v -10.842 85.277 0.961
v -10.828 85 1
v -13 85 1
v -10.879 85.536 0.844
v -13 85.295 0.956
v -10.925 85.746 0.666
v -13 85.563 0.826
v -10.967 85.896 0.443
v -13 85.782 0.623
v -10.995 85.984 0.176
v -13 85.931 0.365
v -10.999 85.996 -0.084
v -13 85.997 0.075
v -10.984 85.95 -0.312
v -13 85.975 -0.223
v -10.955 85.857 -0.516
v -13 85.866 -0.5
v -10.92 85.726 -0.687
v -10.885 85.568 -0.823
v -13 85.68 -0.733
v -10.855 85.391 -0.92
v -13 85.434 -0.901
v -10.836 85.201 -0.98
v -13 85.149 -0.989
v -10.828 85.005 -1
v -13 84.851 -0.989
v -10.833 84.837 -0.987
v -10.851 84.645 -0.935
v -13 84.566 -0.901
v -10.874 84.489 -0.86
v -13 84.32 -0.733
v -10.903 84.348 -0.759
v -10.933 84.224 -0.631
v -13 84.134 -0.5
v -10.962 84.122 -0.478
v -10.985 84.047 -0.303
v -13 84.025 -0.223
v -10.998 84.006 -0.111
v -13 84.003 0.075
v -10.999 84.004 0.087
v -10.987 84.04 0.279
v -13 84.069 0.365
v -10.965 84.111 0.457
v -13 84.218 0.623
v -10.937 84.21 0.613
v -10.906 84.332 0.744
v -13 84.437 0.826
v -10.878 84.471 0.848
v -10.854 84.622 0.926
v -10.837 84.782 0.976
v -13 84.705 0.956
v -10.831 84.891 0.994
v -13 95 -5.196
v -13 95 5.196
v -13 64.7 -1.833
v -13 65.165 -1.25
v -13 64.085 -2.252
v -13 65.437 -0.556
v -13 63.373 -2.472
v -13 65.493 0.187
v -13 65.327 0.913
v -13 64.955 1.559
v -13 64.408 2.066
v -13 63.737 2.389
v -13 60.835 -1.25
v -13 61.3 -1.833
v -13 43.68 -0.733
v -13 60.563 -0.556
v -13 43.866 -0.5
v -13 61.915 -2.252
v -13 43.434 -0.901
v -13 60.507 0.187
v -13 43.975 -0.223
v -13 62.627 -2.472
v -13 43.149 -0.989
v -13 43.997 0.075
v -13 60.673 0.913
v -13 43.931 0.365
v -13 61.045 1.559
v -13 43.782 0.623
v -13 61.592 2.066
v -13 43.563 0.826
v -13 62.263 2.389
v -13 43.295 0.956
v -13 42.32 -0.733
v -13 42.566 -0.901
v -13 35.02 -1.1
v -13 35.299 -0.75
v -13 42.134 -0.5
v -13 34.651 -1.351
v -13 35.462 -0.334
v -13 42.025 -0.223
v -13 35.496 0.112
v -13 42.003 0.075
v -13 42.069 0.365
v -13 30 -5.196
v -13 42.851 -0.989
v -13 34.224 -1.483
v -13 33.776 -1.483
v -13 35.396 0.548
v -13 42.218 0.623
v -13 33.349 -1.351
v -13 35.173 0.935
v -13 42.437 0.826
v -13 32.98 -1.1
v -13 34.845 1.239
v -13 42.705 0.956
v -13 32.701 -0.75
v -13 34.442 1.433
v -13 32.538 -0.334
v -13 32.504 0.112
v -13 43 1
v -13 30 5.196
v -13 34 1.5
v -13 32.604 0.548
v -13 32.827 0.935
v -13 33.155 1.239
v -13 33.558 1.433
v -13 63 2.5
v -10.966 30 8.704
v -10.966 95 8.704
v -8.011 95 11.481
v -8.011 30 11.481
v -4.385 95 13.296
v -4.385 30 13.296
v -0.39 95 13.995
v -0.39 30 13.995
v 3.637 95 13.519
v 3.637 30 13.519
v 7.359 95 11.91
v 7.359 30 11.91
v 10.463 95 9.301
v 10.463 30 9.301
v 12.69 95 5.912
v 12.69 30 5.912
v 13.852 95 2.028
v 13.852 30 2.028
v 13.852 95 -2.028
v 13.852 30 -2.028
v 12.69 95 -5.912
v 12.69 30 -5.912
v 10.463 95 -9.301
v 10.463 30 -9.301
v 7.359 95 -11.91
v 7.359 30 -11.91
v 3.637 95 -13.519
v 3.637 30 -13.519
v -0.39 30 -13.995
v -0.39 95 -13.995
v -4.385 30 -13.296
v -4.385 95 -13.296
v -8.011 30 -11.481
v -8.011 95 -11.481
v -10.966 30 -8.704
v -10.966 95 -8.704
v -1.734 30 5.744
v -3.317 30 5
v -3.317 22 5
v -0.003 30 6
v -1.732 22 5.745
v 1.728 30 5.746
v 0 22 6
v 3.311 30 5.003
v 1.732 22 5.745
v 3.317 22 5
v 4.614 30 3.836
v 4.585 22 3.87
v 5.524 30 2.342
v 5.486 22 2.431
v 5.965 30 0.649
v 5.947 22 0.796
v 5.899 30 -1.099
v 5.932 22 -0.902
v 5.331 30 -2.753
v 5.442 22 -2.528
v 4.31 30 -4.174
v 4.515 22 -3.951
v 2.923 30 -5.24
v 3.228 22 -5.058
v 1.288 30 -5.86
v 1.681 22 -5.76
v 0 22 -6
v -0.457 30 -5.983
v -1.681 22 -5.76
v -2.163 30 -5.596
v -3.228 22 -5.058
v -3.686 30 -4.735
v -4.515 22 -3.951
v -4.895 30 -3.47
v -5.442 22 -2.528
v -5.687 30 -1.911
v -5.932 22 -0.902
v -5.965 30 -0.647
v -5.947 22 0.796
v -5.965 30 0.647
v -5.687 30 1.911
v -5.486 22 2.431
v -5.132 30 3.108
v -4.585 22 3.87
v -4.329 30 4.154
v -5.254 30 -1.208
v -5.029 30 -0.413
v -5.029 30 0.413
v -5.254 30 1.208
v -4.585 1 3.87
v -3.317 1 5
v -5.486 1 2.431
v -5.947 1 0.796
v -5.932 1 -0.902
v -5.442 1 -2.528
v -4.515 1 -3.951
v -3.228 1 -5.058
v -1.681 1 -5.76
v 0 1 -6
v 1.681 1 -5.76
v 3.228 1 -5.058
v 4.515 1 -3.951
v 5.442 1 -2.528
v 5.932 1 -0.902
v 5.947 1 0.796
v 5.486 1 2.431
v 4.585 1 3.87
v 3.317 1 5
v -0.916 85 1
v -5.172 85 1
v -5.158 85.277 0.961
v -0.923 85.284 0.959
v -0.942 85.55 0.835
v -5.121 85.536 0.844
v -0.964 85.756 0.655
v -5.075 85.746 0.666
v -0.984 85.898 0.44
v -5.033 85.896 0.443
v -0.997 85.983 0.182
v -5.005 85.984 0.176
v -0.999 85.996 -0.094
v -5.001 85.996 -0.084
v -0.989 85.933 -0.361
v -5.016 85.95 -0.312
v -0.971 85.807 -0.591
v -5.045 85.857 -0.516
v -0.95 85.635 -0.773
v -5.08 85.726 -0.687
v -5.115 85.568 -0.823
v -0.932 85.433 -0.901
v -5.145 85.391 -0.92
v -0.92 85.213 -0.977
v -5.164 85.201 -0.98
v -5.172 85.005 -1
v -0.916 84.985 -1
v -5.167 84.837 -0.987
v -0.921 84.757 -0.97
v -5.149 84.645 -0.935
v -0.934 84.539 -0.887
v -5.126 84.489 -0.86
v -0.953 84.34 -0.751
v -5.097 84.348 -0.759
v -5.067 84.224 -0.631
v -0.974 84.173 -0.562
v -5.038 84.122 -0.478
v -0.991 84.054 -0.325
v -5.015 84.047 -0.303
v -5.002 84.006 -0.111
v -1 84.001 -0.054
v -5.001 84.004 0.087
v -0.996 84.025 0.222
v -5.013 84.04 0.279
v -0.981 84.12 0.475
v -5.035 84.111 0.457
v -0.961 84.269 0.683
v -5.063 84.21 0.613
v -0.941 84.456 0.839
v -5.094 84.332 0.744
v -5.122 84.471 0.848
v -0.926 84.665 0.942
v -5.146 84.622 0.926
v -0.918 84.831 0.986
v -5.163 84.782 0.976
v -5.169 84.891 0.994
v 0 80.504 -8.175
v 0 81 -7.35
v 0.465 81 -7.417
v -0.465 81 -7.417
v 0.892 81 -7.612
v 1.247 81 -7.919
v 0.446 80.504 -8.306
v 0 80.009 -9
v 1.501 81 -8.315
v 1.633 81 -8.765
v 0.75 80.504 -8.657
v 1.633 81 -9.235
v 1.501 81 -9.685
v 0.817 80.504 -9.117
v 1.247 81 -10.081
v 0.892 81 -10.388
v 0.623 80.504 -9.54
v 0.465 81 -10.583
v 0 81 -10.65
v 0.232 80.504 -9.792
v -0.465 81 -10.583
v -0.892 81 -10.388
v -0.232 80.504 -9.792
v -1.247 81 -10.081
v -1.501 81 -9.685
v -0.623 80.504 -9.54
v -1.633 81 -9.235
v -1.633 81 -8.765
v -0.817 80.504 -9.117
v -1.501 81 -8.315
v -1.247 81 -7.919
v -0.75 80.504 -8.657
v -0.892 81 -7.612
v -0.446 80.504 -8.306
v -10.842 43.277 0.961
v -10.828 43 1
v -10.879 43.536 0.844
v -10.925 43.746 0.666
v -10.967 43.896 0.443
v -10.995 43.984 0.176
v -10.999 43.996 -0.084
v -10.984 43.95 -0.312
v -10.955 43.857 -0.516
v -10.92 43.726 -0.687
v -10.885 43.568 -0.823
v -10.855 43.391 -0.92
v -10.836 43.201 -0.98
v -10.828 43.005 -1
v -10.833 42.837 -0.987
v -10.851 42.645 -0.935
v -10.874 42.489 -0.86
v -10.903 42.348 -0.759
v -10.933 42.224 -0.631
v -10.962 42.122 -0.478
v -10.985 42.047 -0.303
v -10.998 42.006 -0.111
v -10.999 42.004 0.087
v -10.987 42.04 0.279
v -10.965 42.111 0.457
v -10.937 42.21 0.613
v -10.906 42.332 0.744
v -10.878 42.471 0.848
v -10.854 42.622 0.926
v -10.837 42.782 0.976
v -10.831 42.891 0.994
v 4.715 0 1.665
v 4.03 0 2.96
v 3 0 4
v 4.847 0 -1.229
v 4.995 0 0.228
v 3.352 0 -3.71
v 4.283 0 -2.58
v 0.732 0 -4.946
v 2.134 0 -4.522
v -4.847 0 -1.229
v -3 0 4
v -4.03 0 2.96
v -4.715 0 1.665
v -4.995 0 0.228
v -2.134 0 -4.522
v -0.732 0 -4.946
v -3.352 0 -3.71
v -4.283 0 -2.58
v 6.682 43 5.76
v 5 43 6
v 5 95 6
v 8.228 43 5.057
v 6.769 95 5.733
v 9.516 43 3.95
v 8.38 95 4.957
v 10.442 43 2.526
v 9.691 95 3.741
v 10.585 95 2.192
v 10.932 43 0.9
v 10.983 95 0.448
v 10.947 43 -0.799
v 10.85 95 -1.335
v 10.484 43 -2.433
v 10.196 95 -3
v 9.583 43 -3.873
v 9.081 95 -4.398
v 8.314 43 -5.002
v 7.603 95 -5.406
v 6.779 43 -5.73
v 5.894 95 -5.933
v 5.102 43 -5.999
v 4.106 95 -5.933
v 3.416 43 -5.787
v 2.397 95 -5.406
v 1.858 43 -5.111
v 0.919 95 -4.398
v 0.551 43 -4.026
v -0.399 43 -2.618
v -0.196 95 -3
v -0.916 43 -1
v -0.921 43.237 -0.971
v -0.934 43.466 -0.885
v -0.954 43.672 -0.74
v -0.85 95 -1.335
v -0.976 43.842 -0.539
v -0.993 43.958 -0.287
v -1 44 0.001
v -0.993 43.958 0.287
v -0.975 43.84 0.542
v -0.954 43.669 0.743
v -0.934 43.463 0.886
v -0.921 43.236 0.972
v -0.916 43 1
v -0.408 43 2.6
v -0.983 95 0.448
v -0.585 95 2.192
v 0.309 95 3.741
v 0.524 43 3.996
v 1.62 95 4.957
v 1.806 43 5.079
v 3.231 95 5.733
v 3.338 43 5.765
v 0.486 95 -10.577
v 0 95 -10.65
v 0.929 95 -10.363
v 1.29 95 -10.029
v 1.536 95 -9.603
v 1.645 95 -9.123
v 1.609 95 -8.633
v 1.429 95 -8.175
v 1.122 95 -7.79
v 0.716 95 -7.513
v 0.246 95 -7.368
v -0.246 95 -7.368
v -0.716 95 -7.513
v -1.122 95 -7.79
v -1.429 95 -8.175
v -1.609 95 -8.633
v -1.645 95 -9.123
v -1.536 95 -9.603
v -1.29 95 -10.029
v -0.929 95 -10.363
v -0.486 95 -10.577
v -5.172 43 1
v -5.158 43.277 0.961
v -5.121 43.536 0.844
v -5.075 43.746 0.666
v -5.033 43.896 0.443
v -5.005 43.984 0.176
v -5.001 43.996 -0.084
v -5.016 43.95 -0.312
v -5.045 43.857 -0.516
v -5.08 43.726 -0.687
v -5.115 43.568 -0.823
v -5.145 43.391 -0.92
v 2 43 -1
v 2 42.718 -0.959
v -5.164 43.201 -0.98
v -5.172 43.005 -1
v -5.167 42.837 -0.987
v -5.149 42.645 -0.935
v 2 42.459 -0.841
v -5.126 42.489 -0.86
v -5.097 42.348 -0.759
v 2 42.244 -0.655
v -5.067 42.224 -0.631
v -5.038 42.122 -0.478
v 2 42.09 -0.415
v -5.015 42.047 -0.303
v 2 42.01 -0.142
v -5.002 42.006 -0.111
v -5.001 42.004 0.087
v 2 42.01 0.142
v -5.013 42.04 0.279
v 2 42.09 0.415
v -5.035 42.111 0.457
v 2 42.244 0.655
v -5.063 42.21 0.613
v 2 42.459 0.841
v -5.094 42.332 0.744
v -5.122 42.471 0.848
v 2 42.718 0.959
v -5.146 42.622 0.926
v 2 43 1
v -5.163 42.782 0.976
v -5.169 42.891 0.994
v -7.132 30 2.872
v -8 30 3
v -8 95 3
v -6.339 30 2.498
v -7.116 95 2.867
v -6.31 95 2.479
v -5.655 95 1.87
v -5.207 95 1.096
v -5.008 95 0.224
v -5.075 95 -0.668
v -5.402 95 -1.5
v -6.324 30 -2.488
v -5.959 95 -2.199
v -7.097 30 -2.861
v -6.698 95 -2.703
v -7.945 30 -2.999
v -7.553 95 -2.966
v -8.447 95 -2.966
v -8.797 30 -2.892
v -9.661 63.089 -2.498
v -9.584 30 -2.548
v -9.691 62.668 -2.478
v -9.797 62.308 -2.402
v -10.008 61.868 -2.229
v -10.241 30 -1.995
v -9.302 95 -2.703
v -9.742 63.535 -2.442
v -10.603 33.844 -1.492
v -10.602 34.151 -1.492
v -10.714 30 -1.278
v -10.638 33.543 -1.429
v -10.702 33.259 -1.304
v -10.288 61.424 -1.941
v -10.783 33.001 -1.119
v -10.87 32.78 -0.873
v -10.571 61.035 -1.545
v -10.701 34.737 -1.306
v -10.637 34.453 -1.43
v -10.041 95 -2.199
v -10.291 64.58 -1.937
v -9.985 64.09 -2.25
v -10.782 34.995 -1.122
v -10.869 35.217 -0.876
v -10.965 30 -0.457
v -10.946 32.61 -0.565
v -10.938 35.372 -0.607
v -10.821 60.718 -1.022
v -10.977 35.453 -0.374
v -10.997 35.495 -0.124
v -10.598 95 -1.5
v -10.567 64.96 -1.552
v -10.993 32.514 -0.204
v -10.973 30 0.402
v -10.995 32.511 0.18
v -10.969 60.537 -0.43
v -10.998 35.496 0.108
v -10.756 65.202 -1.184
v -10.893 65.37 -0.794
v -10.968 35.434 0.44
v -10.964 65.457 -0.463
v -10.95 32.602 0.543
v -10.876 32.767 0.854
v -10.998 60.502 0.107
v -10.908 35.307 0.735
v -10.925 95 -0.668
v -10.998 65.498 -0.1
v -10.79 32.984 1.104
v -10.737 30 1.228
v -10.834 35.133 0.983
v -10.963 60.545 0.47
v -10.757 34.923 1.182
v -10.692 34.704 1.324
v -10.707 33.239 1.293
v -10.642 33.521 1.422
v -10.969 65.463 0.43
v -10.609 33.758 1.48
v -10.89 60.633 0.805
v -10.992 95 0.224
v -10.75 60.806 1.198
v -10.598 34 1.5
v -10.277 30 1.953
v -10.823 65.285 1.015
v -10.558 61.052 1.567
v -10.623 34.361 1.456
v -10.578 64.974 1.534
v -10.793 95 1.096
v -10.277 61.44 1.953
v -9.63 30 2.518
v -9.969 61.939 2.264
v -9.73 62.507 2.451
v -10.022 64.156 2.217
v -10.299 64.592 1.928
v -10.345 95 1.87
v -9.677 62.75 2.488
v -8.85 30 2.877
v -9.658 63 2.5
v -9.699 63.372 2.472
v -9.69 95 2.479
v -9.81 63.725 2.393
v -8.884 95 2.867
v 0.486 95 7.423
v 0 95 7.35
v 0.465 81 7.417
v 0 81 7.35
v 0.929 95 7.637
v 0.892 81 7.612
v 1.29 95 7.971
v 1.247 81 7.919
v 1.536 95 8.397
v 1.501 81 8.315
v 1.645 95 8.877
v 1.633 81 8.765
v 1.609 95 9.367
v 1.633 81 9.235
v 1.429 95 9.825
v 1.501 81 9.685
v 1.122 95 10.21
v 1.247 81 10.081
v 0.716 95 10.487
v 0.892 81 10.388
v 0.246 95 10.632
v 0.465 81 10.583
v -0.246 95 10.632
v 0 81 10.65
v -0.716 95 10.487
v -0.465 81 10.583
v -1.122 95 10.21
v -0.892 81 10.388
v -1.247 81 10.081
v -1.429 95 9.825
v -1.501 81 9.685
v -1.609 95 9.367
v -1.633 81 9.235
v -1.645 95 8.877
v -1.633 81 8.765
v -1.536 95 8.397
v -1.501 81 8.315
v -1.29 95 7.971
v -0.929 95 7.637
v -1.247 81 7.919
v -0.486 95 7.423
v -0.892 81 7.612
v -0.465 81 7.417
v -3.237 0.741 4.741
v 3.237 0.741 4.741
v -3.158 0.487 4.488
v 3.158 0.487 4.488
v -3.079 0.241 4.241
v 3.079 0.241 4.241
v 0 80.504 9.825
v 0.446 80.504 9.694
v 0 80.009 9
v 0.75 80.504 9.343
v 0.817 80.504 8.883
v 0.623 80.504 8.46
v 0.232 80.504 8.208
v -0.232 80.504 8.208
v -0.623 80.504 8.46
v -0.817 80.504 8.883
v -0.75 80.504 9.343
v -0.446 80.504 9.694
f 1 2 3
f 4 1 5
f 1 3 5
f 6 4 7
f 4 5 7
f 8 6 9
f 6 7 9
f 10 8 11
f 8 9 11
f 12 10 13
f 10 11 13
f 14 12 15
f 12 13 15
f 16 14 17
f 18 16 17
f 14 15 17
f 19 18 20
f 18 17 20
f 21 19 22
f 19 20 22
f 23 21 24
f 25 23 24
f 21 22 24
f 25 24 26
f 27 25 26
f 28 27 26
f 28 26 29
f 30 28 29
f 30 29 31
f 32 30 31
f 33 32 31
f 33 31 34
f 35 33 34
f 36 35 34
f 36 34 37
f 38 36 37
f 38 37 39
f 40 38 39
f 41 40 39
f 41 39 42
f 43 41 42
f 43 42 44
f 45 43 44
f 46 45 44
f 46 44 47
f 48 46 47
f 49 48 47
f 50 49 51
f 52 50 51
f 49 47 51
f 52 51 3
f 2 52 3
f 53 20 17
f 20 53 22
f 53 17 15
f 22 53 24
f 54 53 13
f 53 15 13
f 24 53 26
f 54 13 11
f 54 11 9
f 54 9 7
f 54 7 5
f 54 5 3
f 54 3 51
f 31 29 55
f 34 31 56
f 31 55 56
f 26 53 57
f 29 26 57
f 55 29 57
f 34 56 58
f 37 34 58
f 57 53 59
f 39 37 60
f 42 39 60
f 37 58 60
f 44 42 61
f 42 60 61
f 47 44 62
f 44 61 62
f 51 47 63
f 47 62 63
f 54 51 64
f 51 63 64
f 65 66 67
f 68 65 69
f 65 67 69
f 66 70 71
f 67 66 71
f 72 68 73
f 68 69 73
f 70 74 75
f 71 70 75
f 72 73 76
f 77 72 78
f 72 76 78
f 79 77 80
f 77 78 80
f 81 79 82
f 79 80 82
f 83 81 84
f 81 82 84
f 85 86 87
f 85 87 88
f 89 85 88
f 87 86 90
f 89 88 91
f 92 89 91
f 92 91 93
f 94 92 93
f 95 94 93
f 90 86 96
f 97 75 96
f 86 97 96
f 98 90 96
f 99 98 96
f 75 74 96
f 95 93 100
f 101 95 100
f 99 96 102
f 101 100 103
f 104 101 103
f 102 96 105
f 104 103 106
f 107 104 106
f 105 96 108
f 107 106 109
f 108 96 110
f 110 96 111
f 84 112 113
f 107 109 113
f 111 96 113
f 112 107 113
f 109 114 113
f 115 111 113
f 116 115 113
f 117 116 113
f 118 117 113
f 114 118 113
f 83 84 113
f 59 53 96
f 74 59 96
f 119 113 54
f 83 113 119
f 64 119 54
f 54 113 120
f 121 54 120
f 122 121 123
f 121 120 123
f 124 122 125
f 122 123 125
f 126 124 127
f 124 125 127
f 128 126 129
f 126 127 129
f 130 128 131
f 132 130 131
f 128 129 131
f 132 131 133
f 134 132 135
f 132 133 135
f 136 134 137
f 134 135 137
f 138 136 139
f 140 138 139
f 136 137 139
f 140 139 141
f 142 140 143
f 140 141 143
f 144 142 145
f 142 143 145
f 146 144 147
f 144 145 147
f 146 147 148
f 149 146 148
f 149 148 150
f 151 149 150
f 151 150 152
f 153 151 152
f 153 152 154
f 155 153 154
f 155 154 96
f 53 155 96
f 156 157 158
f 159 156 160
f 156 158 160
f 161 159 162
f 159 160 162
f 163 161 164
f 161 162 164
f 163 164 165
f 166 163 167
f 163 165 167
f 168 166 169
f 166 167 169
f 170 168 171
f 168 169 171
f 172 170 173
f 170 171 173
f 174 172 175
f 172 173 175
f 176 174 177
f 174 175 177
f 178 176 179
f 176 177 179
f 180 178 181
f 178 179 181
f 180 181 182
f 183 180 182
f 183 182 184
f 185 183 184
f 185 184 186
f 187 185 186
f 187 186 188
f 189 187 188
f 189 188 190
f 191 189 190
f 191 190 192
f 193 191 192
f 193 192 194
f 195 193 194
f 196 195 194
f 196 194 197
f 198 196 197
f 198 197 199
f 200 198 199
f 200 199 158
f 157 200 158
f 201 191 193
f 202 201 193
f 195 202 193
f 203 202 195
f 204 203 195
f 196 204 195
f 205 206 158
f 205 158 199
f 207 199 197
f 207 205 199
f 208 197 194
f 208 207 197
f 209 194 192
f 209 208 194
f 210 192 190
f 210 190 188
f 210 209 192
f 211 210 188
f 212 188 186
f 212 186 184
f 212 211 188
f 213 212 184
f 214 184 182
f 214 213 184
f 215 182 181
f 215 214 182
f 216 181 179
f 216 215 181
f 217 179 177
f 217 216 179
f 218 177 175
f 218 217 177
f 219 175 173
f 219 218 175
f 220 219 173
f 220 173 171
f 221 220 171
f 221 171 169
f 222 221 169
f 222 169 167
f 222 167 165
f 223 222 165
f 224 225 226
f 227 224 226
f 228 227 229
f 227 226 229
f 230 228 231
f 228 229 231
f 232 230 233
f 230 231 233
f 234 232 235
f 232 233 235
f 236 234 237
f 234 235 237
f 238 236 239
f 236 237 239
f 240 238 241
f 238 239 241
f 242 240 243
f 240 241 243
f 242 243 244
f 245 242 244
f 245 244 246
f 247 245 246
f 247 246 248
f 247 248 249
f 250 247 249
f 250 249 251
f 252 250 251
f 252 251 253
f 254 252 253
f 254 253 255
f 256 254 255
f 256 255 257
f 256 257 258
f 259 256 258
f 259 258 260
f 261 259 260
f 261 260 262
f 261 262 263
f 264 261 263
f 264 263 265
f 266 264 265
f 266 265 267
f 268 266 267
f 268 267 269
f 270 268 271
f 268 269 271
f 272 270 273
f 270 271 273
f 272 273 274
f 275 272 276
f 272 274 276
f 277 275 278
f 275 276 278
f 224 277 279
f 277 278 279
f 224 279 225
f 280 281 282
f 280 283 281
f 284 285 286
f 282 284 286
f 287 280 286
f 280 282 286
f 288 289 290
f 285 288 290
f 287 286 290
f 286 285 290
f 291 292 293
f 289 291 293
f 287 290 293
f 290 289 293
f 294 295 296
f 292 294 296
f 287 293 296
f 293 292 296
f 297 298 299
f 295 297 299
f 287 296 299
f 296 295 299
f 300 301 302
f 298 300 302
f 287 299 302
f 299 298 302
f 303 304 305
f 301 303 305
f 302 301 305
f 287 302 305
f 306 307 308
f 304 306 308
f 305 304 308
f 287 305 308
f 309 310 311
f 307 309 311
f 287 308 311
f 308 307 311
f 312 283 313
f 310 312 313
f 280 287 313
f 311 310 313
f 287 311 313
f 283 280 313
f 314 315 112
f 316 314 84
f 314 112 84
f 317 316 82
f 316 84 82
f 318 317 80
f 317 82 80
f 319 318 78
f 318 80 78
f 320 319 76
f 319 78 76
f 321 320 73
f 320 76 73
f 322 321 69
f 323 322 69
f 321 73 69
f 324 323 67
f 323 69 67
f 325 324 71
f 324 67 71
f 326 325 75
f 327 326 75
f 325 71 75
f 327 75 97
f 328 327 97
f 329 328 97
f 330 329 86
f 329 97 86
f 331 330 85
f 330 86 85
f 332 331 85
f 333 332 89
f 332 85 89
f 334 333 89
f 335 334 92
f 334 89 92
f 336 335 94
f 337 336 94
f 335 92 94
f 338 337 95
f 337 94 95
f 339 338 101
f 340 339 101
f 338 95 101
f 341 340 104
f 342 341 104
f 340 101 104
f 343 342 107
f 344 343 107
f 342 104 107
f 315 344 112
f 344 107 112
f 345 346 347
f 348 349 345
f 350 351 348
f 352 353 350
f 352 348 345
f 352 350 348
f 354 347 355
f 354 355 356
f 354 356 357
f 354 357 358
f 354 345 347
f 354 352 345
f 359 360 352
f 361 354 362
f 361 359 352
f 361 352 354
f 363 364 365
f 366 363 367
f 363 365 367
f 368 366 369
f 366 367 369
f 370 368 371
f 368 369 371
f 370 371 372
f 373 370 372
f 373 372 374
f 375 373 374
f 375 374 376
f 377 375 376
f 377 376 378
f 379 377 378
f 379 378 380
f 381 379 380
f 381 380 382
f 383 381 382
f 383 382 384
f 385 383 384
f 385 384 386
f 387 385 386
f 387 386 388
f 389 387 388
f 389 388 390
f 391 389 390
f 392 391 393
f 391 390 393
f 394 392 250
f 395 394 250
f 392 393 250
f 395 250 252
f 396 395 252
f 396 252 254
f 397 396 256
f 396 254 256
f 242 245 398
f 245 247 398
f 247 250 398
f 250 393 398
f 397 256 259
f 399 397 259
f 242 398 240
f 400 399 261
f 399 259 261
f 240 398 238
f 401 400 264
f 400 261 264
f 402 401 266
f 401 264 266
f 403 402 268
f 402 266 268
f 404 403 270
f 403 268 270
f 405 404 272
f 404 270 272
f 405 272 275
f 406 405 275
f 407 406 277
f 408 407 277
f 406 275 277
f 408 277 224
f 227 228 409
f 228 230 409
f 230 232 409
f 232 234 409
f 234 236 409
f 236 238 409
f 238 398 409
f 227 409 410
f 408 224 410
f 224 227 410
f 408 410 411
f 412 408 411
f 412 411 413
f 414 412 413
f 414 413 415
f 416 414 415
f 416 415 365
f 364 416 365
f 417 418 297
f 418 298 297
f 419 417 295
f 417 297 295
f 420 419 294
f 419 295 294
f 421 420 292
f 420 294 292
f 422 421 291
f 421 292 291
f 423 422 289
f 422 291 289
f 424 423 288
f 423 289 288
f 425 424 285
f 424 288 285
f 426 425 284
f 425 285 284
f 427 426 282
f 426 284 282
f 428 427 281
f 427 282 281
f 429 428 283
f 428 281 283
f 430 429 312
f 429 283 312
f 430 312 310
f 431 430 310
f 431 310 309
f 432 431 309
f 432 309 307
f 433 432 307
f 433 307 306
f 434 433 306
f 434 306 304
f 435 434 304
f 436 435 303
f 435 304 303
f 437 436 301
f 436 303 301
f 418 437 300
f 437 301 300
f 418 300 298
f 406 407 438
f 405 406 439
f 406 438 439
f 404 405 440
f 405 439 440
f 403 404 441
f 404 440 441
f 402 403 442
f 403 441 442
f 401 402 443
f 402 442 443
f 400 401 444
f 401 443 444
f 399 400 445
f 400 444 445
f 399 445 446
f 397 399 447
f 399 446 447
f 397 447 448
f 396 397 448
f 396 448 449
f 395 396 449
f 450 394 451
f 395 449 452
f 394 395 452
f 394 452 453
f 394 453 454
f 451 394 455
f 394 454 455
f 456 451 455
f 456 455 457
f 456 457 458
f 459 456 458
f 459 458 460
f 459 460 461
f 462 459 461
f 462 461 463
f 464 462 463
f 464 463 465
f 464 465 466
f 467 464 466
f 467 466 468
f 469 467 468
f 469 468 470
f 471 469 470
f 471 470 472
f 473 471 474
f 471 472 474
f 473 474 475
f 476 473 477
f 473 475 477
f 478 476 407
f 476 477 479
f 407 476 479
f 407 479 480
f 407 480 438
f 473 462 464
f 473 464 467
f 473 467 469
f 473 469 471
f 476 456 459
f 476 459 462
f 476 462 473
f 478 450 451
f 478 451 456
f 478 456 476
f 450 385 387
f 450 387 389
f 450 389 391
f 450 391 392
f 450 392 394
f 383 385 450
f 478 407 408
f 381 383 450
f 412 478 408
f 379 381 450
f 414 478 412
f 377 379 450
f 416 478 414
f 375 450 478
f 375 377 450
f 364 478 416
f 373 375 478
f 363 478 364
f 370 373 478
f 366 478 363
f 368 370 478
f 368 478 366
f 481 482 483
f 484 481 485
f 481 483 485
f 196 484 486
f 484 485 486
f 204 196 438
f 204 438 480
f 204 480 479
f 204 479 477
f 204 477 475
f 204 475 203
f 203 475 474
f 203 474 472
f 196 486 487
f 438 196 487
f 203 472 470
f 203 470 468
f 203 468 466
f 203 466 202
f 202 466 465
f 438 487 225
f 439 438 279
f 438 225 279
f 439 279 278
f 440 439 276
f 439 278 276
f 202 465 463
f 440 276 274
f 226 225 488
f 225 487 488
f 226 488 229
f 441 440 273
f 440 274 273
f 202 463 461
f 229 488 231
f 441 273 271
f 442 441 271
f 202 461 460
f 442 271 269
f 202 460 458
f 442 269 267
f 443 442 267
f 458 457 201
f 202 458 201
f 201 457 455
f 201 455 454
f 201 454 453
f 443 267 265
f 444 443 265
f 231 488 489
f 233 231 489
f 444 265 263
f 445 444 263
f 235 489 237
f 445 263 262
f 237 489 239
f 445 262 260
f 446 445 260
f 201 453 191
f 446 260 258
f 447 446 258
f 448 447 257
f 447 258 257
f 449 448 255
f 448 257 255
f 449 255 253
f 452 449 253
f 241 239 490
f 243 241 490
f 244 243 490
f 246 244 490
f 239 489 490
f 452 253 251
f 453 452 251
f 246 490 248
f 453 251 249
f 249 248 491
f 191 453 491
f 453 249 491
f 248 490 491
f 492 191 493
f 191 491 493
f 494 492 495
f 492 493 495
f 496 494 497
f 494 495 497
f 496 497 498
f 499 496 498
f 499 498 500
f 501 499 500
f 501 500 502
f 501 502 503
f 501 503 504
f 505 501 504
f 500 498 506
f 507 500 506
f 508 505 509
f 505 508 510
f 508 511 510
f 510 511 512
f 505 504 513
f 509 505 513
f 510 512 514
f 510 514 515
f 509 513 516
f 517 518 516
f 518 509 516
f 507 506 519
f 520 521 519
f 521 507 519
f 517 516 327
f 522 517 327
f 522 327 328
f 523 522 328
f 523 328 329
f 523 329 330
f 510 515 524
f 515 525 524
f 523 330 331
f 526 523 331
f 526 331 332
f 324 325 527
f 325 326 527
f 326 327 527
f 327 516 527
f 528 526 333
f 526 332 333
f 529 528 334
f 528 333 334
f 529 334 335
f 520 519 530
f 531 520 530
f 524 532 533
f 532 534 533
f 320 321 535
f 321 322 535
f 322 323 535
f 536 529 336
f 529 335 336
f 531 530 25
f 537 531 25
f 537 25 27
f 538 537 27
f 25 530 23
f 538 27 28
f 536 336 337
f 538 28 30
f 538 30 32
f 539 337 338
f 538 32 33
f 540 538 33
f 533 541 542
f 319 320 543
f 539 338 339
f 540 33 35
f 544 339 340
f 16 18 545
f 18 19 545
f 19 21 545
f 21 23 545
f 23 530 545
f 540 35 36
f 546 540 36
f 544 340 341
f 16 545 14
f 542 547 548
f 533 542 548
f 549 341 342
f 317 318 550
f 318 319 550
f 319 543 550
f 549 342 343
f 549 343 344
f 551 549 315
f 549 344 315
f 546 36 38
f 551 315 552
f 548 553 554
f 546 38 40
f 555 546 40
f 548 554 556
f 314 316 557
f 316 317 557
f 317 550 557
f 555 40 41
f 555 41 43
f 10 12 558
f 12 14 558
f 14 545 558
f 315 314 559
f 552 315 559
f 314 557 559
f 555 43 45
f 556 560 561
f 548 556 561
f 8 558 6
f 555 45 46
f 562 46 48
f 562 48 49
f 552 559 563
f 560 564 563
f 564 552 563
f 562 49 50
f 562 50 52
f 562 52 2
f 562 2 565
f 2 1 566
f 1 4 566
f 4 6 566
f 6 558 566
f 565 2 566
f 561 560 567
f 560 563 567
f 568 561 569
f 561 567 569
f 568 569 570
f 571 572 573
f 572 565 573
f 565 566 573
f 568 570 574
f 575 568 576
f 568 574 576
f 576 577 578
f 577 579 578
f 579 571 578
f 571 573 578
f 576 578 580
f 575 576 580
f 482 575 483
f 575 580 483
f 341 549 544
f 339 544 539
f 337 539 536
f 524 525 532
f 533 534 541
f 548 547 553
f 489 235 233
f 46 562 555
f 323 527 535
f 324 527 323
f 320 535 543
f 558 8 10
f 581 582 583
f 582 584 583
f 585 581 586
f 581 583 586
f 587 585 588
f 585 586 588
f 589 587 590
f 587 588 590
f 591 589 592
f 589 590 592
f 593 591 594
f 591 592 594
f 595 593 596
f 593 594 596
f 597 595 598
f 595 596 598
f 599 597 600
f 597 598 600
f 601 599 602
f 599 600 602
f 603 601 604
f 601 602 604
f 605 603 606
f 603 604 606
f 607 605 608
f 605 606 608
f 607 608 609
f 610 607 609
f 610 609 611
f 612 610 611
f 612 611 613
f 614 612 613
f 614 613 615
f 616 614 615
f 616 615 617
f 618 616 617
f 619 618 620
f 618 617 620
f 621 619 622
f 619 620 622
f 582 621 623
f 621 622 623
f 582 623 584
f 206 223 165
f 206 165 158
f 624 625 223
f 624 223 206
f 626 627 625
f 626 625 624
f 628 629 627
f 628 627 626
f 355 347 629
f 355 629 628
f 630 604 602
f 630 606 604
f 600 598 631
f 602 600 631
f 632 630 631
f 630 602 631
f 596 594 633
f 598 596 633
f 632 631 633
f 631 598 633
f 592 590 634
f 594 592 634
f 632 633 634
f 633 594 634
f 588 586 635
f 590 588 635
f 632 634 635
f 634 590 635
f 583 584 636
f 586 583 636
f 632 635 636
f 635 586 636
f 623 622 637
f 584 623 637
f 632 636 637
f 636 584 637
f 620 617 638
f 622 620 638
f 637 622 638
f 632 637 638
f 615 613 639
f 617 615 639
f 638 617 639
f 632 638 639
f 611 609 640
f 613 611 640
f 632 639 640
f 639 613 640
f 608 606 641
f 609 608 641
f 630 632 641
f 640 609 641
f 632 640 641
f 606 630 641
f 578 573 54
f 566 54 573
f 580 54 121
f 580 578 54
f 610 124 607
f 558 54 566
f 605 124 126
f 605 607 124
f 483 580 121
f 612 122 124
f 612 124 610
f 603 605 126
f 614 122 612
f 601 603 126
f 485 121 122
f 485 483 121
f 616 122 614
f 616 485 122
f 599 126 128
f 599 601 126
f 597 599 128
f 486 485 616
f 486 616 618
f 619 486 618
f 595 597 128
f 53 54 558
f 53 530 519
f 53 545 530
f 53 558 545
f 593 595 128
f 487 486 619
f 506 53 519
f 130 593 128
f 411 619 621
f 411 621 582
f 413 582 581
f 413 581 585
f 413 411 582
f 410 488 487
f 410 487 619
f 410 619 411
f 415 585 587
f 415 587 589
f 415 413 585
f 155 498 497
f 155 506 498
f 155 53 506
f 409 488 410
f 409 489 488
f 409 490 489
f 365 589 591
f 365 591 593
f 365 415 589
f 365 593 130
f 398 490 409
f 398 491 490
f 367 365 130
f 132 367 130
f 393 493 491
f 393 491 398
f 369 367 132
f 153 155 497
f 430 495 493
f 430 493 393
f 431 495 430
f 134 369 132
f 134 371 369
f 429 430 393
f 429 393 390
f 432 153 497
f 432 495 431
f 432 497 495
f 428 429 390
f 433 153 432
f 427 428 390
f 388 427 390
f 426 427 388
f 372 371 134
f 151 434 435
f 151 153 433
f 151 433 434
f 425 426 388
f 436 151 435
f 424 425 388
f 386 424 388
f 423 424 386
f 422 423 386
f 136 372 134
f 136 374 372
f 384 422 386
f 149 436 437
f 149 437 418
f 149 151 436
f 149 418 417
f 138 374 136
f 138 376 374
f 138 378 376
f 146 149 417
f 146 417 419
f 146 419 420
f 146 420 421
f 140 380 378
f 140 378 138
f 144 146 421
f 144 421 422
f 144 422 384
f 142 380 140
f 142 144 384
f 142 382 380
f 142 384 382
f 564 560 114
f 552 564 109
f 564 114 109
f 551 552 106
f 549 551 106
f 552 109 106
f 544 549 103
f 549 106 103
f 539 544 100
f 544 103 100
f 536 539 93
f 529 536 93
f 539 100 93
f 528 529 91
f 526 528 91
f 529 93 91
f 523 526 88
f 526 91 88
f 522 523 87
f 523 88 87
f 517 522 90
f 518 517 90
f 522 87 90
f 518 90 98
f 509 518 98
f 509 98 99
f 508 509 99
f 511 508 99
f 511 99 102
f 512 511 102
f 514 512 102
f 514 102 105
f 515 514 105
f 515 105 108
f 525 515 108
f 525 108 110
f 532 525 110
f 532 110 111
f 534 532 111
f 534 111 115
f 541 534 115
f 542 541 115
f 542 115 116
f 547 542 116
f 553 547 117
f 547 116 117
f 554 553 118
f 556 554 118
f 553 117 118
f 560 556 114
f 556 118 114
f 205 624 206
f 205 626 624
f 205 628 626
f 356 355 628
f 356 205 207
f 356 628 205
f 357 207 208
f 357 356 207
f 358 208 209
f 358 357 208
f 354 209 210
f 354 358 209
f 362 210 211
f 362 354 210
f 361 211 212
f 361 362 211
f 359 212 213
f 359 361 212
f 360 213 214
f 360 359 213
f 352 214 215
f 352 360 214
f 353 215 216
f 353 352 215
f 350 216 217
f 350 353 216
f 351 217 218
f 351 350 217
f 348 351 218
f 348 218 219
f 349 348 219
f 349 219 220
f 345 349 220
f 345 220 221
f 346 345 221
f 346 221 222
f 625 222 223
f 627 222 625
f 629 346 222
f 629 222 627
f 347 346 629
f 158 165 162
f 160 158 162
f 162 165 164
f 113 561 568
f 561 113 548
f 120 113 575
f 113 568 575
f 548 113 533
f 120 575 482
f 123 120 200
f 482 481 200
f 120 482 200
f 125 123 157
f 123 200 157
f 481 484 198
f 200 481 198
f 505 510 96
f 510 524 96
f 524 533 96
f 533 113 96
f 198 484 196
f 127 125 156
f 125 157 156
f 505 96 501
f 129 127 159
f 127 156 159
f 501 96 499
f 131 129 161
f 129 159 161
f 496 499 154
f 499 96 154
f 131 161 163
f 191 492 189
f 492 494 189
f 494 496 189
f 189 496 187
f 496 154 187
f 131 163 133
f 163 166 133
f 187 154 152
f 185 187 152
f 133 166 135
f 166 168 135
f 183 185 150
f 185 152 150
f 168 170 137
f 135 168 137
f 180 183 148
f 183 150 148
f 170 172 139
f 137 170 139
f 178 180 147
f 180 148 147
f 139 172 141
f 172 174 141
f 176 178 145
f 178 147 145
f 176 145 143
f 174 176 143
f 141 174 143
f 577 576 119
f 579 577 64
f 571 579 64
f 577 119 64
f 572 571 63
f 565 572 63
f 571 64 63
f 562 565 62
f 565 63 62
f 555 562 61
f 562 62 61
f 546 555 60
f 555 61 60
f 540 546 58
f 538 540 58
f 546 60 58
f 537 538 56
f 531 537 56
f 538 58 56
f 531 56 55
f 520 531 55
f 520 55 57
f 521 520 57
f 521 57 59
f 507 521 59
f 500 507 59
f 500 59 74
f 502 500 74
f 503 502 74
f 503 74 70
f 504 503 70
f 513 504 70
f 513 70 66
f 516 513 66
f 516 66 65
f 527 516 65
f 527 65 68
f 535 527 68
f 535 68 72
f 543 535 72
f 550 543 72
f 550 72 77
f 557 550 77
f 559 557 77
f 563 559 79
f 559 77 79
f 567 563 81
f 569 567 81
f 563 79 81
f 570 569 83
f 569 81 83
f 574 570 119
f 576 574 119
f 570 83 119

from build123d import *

# Parameters (mm, degrees)
BOSS_EXTRUDE2_DEPTH   = 22
SKETCH6_R             = 6
BOSS_EXTRUDE3_DEPTH   = 8
BOSS_EXTRUDE4_DEPTH   = 65
SKETCH8_R             = 3
CUT_EXTRUDE5_DEPTH    = 65
SKETCH9_R             = 6
CUT_EXTRUDE6_DEPTH    = 52
M4_TAPPED_HOLE1_D     = 3.3
M4_TAPPED_HOLE1_DEPTH = 14
M4_TAPPED_HOLE1_TIP   = 0.991420021
SKETCH13_R            = 1.5
SKETCH13_R_2          = 2.5
CUT_EXTRUDE7_DEPTH    = 5
SKETCH14_R            = 1
CUT_EXTRUDE8_DEPTH    = 15
CHAMFER1_SIZE         = 1


with BuildPart() as part:
    # Sketch2 → Boss-Extrude2 (new body)
    with BuildSketch(Plane(origin=(0, 0, 0), x_dir=(1, 0, 0), z_dir=(0, 1, 0))):
        with BuildLine():
            Line((3.31662479, -5), (-3.31662479, -5))
            ThreePointArc((-3.31662479, -5), (0, 6), (3.31662479, -5))
        make_face()
    extrude(amount=BOSS_EXTRUDE2_DEPTH)

    # Sketch6 → Boss-Extrude3 (add)
    with BuildSketch(Plane(origin=(0, 22, 0), x_dir=(1, 0, 0), z_dir=(0, 1, 0))):
        with Locations(Location((0, 0, 0), (0, 0, 236.442690238))):
            Circle(SKETCH6_R)
    extrude(amount=BOSS_EXTRUDE3_DEPTH)

    # Sketch7 → Boss-Extrude4 (add)
    with BuildSketch(Plane(origin=(0, 30, 0), x_dir=(1, 0, 0), z_dir=(0, 1, 0))):
        with BuildLine():
            Line((-13, 5.196152423), (-13, -5.196152423))
            ThreePointArc((-13, -5.196152423), (14, 0), (-13, 5.196152423))
        make_face()
    extrude(amount=BOSS_EXTRUDE4_DEPTH)

    # Sketch8 → Cut-Extrude5 (cut)
    with BuildSketch(Plane(origin=(0, 95, 0), x_dir=(1, 0, 0), z_dir=(0, 1, 0))):
        with Locations(Location((-8, 0, 0), (0, 0, 270))):
            Circle(SKETCH8_R)
    extrude(amount=-CUT_EXTRUDE5_DEPTH, mode=Mode.SUBTRACT)

    # Sketch9 → Cut-Extrude6 (cut)
    with BuildSketch(Plane(origin=(0, 95, 0), x_dir=(1, 0, 0), z_dir=(0, 1, 0))):
        with Locations(Location((5, 0, 0), (0, 0, 270))):
            Circle(SKETCH9_R)
    extrude(amount=-CUT_EXTRUDE6_DEPTH, mode=Mode.SUBTRACT)

    # M4 Tapped Hole1
    with Locations(Plane(origin=(0, 95, -9), x_dir=(0, 0, 1), z_dir=(0, 1, 0))):
        with Locations((0, 0), (18, 0)):
            Hole(M4_TAPPED_HOLE1_D / 2, depth=M4_TAPPED_HOLE1_DEPTH)
            with Locations((0, 0, -(M4_TAPPED_HOLE1_DEPTH + M4_TAPPED_HOLE1_TIP / 2))):  # 118° drill point
                Cone(0, M4_TAPPED_HOLE1_D / 2, M4_TAPPED_HOLE1_TIP, mode=Mode.SUBTRACT)

    # Sketch13 → Cut-Extrude7 (cut)
    with BuildSketch(Plane.ZY.offset(13)):
        with Locations((0, 34)):
            Circle(SKETCH13_R)
        with Locations((0, 63)):
            Circle(SKETCH13_R_2)
    extrude(amount=-CUT_EXTRUDE7_DEPTH, mode=Mode.SUBTRACT)

    # Sketch14 → Cut-Extrude8 (cut)
    with BuildSketch(Plane.ZY.offset(13)):
        with Locations((0, 85)):
            Circle(SKETCH14_R)
        with Locations((0, 43)):
            Circle(SKETCH14_R)
    extrude(amount=-CUT_EXTRUDE8_DEPTH, mode=Mode.SUBTRACT)

    # Chamfer1
    chamfer1_edges = [part.edges().sort_by_distance(p)[0] for p in [
        (0, 0, 5),
        (0, 0, -6),
    ]]
    chamfer(chamfer1_edges, length=CHAMFER1_SIZE - 0.0001)  # a hair under: the kernel refuses the full size


solid = part.part
